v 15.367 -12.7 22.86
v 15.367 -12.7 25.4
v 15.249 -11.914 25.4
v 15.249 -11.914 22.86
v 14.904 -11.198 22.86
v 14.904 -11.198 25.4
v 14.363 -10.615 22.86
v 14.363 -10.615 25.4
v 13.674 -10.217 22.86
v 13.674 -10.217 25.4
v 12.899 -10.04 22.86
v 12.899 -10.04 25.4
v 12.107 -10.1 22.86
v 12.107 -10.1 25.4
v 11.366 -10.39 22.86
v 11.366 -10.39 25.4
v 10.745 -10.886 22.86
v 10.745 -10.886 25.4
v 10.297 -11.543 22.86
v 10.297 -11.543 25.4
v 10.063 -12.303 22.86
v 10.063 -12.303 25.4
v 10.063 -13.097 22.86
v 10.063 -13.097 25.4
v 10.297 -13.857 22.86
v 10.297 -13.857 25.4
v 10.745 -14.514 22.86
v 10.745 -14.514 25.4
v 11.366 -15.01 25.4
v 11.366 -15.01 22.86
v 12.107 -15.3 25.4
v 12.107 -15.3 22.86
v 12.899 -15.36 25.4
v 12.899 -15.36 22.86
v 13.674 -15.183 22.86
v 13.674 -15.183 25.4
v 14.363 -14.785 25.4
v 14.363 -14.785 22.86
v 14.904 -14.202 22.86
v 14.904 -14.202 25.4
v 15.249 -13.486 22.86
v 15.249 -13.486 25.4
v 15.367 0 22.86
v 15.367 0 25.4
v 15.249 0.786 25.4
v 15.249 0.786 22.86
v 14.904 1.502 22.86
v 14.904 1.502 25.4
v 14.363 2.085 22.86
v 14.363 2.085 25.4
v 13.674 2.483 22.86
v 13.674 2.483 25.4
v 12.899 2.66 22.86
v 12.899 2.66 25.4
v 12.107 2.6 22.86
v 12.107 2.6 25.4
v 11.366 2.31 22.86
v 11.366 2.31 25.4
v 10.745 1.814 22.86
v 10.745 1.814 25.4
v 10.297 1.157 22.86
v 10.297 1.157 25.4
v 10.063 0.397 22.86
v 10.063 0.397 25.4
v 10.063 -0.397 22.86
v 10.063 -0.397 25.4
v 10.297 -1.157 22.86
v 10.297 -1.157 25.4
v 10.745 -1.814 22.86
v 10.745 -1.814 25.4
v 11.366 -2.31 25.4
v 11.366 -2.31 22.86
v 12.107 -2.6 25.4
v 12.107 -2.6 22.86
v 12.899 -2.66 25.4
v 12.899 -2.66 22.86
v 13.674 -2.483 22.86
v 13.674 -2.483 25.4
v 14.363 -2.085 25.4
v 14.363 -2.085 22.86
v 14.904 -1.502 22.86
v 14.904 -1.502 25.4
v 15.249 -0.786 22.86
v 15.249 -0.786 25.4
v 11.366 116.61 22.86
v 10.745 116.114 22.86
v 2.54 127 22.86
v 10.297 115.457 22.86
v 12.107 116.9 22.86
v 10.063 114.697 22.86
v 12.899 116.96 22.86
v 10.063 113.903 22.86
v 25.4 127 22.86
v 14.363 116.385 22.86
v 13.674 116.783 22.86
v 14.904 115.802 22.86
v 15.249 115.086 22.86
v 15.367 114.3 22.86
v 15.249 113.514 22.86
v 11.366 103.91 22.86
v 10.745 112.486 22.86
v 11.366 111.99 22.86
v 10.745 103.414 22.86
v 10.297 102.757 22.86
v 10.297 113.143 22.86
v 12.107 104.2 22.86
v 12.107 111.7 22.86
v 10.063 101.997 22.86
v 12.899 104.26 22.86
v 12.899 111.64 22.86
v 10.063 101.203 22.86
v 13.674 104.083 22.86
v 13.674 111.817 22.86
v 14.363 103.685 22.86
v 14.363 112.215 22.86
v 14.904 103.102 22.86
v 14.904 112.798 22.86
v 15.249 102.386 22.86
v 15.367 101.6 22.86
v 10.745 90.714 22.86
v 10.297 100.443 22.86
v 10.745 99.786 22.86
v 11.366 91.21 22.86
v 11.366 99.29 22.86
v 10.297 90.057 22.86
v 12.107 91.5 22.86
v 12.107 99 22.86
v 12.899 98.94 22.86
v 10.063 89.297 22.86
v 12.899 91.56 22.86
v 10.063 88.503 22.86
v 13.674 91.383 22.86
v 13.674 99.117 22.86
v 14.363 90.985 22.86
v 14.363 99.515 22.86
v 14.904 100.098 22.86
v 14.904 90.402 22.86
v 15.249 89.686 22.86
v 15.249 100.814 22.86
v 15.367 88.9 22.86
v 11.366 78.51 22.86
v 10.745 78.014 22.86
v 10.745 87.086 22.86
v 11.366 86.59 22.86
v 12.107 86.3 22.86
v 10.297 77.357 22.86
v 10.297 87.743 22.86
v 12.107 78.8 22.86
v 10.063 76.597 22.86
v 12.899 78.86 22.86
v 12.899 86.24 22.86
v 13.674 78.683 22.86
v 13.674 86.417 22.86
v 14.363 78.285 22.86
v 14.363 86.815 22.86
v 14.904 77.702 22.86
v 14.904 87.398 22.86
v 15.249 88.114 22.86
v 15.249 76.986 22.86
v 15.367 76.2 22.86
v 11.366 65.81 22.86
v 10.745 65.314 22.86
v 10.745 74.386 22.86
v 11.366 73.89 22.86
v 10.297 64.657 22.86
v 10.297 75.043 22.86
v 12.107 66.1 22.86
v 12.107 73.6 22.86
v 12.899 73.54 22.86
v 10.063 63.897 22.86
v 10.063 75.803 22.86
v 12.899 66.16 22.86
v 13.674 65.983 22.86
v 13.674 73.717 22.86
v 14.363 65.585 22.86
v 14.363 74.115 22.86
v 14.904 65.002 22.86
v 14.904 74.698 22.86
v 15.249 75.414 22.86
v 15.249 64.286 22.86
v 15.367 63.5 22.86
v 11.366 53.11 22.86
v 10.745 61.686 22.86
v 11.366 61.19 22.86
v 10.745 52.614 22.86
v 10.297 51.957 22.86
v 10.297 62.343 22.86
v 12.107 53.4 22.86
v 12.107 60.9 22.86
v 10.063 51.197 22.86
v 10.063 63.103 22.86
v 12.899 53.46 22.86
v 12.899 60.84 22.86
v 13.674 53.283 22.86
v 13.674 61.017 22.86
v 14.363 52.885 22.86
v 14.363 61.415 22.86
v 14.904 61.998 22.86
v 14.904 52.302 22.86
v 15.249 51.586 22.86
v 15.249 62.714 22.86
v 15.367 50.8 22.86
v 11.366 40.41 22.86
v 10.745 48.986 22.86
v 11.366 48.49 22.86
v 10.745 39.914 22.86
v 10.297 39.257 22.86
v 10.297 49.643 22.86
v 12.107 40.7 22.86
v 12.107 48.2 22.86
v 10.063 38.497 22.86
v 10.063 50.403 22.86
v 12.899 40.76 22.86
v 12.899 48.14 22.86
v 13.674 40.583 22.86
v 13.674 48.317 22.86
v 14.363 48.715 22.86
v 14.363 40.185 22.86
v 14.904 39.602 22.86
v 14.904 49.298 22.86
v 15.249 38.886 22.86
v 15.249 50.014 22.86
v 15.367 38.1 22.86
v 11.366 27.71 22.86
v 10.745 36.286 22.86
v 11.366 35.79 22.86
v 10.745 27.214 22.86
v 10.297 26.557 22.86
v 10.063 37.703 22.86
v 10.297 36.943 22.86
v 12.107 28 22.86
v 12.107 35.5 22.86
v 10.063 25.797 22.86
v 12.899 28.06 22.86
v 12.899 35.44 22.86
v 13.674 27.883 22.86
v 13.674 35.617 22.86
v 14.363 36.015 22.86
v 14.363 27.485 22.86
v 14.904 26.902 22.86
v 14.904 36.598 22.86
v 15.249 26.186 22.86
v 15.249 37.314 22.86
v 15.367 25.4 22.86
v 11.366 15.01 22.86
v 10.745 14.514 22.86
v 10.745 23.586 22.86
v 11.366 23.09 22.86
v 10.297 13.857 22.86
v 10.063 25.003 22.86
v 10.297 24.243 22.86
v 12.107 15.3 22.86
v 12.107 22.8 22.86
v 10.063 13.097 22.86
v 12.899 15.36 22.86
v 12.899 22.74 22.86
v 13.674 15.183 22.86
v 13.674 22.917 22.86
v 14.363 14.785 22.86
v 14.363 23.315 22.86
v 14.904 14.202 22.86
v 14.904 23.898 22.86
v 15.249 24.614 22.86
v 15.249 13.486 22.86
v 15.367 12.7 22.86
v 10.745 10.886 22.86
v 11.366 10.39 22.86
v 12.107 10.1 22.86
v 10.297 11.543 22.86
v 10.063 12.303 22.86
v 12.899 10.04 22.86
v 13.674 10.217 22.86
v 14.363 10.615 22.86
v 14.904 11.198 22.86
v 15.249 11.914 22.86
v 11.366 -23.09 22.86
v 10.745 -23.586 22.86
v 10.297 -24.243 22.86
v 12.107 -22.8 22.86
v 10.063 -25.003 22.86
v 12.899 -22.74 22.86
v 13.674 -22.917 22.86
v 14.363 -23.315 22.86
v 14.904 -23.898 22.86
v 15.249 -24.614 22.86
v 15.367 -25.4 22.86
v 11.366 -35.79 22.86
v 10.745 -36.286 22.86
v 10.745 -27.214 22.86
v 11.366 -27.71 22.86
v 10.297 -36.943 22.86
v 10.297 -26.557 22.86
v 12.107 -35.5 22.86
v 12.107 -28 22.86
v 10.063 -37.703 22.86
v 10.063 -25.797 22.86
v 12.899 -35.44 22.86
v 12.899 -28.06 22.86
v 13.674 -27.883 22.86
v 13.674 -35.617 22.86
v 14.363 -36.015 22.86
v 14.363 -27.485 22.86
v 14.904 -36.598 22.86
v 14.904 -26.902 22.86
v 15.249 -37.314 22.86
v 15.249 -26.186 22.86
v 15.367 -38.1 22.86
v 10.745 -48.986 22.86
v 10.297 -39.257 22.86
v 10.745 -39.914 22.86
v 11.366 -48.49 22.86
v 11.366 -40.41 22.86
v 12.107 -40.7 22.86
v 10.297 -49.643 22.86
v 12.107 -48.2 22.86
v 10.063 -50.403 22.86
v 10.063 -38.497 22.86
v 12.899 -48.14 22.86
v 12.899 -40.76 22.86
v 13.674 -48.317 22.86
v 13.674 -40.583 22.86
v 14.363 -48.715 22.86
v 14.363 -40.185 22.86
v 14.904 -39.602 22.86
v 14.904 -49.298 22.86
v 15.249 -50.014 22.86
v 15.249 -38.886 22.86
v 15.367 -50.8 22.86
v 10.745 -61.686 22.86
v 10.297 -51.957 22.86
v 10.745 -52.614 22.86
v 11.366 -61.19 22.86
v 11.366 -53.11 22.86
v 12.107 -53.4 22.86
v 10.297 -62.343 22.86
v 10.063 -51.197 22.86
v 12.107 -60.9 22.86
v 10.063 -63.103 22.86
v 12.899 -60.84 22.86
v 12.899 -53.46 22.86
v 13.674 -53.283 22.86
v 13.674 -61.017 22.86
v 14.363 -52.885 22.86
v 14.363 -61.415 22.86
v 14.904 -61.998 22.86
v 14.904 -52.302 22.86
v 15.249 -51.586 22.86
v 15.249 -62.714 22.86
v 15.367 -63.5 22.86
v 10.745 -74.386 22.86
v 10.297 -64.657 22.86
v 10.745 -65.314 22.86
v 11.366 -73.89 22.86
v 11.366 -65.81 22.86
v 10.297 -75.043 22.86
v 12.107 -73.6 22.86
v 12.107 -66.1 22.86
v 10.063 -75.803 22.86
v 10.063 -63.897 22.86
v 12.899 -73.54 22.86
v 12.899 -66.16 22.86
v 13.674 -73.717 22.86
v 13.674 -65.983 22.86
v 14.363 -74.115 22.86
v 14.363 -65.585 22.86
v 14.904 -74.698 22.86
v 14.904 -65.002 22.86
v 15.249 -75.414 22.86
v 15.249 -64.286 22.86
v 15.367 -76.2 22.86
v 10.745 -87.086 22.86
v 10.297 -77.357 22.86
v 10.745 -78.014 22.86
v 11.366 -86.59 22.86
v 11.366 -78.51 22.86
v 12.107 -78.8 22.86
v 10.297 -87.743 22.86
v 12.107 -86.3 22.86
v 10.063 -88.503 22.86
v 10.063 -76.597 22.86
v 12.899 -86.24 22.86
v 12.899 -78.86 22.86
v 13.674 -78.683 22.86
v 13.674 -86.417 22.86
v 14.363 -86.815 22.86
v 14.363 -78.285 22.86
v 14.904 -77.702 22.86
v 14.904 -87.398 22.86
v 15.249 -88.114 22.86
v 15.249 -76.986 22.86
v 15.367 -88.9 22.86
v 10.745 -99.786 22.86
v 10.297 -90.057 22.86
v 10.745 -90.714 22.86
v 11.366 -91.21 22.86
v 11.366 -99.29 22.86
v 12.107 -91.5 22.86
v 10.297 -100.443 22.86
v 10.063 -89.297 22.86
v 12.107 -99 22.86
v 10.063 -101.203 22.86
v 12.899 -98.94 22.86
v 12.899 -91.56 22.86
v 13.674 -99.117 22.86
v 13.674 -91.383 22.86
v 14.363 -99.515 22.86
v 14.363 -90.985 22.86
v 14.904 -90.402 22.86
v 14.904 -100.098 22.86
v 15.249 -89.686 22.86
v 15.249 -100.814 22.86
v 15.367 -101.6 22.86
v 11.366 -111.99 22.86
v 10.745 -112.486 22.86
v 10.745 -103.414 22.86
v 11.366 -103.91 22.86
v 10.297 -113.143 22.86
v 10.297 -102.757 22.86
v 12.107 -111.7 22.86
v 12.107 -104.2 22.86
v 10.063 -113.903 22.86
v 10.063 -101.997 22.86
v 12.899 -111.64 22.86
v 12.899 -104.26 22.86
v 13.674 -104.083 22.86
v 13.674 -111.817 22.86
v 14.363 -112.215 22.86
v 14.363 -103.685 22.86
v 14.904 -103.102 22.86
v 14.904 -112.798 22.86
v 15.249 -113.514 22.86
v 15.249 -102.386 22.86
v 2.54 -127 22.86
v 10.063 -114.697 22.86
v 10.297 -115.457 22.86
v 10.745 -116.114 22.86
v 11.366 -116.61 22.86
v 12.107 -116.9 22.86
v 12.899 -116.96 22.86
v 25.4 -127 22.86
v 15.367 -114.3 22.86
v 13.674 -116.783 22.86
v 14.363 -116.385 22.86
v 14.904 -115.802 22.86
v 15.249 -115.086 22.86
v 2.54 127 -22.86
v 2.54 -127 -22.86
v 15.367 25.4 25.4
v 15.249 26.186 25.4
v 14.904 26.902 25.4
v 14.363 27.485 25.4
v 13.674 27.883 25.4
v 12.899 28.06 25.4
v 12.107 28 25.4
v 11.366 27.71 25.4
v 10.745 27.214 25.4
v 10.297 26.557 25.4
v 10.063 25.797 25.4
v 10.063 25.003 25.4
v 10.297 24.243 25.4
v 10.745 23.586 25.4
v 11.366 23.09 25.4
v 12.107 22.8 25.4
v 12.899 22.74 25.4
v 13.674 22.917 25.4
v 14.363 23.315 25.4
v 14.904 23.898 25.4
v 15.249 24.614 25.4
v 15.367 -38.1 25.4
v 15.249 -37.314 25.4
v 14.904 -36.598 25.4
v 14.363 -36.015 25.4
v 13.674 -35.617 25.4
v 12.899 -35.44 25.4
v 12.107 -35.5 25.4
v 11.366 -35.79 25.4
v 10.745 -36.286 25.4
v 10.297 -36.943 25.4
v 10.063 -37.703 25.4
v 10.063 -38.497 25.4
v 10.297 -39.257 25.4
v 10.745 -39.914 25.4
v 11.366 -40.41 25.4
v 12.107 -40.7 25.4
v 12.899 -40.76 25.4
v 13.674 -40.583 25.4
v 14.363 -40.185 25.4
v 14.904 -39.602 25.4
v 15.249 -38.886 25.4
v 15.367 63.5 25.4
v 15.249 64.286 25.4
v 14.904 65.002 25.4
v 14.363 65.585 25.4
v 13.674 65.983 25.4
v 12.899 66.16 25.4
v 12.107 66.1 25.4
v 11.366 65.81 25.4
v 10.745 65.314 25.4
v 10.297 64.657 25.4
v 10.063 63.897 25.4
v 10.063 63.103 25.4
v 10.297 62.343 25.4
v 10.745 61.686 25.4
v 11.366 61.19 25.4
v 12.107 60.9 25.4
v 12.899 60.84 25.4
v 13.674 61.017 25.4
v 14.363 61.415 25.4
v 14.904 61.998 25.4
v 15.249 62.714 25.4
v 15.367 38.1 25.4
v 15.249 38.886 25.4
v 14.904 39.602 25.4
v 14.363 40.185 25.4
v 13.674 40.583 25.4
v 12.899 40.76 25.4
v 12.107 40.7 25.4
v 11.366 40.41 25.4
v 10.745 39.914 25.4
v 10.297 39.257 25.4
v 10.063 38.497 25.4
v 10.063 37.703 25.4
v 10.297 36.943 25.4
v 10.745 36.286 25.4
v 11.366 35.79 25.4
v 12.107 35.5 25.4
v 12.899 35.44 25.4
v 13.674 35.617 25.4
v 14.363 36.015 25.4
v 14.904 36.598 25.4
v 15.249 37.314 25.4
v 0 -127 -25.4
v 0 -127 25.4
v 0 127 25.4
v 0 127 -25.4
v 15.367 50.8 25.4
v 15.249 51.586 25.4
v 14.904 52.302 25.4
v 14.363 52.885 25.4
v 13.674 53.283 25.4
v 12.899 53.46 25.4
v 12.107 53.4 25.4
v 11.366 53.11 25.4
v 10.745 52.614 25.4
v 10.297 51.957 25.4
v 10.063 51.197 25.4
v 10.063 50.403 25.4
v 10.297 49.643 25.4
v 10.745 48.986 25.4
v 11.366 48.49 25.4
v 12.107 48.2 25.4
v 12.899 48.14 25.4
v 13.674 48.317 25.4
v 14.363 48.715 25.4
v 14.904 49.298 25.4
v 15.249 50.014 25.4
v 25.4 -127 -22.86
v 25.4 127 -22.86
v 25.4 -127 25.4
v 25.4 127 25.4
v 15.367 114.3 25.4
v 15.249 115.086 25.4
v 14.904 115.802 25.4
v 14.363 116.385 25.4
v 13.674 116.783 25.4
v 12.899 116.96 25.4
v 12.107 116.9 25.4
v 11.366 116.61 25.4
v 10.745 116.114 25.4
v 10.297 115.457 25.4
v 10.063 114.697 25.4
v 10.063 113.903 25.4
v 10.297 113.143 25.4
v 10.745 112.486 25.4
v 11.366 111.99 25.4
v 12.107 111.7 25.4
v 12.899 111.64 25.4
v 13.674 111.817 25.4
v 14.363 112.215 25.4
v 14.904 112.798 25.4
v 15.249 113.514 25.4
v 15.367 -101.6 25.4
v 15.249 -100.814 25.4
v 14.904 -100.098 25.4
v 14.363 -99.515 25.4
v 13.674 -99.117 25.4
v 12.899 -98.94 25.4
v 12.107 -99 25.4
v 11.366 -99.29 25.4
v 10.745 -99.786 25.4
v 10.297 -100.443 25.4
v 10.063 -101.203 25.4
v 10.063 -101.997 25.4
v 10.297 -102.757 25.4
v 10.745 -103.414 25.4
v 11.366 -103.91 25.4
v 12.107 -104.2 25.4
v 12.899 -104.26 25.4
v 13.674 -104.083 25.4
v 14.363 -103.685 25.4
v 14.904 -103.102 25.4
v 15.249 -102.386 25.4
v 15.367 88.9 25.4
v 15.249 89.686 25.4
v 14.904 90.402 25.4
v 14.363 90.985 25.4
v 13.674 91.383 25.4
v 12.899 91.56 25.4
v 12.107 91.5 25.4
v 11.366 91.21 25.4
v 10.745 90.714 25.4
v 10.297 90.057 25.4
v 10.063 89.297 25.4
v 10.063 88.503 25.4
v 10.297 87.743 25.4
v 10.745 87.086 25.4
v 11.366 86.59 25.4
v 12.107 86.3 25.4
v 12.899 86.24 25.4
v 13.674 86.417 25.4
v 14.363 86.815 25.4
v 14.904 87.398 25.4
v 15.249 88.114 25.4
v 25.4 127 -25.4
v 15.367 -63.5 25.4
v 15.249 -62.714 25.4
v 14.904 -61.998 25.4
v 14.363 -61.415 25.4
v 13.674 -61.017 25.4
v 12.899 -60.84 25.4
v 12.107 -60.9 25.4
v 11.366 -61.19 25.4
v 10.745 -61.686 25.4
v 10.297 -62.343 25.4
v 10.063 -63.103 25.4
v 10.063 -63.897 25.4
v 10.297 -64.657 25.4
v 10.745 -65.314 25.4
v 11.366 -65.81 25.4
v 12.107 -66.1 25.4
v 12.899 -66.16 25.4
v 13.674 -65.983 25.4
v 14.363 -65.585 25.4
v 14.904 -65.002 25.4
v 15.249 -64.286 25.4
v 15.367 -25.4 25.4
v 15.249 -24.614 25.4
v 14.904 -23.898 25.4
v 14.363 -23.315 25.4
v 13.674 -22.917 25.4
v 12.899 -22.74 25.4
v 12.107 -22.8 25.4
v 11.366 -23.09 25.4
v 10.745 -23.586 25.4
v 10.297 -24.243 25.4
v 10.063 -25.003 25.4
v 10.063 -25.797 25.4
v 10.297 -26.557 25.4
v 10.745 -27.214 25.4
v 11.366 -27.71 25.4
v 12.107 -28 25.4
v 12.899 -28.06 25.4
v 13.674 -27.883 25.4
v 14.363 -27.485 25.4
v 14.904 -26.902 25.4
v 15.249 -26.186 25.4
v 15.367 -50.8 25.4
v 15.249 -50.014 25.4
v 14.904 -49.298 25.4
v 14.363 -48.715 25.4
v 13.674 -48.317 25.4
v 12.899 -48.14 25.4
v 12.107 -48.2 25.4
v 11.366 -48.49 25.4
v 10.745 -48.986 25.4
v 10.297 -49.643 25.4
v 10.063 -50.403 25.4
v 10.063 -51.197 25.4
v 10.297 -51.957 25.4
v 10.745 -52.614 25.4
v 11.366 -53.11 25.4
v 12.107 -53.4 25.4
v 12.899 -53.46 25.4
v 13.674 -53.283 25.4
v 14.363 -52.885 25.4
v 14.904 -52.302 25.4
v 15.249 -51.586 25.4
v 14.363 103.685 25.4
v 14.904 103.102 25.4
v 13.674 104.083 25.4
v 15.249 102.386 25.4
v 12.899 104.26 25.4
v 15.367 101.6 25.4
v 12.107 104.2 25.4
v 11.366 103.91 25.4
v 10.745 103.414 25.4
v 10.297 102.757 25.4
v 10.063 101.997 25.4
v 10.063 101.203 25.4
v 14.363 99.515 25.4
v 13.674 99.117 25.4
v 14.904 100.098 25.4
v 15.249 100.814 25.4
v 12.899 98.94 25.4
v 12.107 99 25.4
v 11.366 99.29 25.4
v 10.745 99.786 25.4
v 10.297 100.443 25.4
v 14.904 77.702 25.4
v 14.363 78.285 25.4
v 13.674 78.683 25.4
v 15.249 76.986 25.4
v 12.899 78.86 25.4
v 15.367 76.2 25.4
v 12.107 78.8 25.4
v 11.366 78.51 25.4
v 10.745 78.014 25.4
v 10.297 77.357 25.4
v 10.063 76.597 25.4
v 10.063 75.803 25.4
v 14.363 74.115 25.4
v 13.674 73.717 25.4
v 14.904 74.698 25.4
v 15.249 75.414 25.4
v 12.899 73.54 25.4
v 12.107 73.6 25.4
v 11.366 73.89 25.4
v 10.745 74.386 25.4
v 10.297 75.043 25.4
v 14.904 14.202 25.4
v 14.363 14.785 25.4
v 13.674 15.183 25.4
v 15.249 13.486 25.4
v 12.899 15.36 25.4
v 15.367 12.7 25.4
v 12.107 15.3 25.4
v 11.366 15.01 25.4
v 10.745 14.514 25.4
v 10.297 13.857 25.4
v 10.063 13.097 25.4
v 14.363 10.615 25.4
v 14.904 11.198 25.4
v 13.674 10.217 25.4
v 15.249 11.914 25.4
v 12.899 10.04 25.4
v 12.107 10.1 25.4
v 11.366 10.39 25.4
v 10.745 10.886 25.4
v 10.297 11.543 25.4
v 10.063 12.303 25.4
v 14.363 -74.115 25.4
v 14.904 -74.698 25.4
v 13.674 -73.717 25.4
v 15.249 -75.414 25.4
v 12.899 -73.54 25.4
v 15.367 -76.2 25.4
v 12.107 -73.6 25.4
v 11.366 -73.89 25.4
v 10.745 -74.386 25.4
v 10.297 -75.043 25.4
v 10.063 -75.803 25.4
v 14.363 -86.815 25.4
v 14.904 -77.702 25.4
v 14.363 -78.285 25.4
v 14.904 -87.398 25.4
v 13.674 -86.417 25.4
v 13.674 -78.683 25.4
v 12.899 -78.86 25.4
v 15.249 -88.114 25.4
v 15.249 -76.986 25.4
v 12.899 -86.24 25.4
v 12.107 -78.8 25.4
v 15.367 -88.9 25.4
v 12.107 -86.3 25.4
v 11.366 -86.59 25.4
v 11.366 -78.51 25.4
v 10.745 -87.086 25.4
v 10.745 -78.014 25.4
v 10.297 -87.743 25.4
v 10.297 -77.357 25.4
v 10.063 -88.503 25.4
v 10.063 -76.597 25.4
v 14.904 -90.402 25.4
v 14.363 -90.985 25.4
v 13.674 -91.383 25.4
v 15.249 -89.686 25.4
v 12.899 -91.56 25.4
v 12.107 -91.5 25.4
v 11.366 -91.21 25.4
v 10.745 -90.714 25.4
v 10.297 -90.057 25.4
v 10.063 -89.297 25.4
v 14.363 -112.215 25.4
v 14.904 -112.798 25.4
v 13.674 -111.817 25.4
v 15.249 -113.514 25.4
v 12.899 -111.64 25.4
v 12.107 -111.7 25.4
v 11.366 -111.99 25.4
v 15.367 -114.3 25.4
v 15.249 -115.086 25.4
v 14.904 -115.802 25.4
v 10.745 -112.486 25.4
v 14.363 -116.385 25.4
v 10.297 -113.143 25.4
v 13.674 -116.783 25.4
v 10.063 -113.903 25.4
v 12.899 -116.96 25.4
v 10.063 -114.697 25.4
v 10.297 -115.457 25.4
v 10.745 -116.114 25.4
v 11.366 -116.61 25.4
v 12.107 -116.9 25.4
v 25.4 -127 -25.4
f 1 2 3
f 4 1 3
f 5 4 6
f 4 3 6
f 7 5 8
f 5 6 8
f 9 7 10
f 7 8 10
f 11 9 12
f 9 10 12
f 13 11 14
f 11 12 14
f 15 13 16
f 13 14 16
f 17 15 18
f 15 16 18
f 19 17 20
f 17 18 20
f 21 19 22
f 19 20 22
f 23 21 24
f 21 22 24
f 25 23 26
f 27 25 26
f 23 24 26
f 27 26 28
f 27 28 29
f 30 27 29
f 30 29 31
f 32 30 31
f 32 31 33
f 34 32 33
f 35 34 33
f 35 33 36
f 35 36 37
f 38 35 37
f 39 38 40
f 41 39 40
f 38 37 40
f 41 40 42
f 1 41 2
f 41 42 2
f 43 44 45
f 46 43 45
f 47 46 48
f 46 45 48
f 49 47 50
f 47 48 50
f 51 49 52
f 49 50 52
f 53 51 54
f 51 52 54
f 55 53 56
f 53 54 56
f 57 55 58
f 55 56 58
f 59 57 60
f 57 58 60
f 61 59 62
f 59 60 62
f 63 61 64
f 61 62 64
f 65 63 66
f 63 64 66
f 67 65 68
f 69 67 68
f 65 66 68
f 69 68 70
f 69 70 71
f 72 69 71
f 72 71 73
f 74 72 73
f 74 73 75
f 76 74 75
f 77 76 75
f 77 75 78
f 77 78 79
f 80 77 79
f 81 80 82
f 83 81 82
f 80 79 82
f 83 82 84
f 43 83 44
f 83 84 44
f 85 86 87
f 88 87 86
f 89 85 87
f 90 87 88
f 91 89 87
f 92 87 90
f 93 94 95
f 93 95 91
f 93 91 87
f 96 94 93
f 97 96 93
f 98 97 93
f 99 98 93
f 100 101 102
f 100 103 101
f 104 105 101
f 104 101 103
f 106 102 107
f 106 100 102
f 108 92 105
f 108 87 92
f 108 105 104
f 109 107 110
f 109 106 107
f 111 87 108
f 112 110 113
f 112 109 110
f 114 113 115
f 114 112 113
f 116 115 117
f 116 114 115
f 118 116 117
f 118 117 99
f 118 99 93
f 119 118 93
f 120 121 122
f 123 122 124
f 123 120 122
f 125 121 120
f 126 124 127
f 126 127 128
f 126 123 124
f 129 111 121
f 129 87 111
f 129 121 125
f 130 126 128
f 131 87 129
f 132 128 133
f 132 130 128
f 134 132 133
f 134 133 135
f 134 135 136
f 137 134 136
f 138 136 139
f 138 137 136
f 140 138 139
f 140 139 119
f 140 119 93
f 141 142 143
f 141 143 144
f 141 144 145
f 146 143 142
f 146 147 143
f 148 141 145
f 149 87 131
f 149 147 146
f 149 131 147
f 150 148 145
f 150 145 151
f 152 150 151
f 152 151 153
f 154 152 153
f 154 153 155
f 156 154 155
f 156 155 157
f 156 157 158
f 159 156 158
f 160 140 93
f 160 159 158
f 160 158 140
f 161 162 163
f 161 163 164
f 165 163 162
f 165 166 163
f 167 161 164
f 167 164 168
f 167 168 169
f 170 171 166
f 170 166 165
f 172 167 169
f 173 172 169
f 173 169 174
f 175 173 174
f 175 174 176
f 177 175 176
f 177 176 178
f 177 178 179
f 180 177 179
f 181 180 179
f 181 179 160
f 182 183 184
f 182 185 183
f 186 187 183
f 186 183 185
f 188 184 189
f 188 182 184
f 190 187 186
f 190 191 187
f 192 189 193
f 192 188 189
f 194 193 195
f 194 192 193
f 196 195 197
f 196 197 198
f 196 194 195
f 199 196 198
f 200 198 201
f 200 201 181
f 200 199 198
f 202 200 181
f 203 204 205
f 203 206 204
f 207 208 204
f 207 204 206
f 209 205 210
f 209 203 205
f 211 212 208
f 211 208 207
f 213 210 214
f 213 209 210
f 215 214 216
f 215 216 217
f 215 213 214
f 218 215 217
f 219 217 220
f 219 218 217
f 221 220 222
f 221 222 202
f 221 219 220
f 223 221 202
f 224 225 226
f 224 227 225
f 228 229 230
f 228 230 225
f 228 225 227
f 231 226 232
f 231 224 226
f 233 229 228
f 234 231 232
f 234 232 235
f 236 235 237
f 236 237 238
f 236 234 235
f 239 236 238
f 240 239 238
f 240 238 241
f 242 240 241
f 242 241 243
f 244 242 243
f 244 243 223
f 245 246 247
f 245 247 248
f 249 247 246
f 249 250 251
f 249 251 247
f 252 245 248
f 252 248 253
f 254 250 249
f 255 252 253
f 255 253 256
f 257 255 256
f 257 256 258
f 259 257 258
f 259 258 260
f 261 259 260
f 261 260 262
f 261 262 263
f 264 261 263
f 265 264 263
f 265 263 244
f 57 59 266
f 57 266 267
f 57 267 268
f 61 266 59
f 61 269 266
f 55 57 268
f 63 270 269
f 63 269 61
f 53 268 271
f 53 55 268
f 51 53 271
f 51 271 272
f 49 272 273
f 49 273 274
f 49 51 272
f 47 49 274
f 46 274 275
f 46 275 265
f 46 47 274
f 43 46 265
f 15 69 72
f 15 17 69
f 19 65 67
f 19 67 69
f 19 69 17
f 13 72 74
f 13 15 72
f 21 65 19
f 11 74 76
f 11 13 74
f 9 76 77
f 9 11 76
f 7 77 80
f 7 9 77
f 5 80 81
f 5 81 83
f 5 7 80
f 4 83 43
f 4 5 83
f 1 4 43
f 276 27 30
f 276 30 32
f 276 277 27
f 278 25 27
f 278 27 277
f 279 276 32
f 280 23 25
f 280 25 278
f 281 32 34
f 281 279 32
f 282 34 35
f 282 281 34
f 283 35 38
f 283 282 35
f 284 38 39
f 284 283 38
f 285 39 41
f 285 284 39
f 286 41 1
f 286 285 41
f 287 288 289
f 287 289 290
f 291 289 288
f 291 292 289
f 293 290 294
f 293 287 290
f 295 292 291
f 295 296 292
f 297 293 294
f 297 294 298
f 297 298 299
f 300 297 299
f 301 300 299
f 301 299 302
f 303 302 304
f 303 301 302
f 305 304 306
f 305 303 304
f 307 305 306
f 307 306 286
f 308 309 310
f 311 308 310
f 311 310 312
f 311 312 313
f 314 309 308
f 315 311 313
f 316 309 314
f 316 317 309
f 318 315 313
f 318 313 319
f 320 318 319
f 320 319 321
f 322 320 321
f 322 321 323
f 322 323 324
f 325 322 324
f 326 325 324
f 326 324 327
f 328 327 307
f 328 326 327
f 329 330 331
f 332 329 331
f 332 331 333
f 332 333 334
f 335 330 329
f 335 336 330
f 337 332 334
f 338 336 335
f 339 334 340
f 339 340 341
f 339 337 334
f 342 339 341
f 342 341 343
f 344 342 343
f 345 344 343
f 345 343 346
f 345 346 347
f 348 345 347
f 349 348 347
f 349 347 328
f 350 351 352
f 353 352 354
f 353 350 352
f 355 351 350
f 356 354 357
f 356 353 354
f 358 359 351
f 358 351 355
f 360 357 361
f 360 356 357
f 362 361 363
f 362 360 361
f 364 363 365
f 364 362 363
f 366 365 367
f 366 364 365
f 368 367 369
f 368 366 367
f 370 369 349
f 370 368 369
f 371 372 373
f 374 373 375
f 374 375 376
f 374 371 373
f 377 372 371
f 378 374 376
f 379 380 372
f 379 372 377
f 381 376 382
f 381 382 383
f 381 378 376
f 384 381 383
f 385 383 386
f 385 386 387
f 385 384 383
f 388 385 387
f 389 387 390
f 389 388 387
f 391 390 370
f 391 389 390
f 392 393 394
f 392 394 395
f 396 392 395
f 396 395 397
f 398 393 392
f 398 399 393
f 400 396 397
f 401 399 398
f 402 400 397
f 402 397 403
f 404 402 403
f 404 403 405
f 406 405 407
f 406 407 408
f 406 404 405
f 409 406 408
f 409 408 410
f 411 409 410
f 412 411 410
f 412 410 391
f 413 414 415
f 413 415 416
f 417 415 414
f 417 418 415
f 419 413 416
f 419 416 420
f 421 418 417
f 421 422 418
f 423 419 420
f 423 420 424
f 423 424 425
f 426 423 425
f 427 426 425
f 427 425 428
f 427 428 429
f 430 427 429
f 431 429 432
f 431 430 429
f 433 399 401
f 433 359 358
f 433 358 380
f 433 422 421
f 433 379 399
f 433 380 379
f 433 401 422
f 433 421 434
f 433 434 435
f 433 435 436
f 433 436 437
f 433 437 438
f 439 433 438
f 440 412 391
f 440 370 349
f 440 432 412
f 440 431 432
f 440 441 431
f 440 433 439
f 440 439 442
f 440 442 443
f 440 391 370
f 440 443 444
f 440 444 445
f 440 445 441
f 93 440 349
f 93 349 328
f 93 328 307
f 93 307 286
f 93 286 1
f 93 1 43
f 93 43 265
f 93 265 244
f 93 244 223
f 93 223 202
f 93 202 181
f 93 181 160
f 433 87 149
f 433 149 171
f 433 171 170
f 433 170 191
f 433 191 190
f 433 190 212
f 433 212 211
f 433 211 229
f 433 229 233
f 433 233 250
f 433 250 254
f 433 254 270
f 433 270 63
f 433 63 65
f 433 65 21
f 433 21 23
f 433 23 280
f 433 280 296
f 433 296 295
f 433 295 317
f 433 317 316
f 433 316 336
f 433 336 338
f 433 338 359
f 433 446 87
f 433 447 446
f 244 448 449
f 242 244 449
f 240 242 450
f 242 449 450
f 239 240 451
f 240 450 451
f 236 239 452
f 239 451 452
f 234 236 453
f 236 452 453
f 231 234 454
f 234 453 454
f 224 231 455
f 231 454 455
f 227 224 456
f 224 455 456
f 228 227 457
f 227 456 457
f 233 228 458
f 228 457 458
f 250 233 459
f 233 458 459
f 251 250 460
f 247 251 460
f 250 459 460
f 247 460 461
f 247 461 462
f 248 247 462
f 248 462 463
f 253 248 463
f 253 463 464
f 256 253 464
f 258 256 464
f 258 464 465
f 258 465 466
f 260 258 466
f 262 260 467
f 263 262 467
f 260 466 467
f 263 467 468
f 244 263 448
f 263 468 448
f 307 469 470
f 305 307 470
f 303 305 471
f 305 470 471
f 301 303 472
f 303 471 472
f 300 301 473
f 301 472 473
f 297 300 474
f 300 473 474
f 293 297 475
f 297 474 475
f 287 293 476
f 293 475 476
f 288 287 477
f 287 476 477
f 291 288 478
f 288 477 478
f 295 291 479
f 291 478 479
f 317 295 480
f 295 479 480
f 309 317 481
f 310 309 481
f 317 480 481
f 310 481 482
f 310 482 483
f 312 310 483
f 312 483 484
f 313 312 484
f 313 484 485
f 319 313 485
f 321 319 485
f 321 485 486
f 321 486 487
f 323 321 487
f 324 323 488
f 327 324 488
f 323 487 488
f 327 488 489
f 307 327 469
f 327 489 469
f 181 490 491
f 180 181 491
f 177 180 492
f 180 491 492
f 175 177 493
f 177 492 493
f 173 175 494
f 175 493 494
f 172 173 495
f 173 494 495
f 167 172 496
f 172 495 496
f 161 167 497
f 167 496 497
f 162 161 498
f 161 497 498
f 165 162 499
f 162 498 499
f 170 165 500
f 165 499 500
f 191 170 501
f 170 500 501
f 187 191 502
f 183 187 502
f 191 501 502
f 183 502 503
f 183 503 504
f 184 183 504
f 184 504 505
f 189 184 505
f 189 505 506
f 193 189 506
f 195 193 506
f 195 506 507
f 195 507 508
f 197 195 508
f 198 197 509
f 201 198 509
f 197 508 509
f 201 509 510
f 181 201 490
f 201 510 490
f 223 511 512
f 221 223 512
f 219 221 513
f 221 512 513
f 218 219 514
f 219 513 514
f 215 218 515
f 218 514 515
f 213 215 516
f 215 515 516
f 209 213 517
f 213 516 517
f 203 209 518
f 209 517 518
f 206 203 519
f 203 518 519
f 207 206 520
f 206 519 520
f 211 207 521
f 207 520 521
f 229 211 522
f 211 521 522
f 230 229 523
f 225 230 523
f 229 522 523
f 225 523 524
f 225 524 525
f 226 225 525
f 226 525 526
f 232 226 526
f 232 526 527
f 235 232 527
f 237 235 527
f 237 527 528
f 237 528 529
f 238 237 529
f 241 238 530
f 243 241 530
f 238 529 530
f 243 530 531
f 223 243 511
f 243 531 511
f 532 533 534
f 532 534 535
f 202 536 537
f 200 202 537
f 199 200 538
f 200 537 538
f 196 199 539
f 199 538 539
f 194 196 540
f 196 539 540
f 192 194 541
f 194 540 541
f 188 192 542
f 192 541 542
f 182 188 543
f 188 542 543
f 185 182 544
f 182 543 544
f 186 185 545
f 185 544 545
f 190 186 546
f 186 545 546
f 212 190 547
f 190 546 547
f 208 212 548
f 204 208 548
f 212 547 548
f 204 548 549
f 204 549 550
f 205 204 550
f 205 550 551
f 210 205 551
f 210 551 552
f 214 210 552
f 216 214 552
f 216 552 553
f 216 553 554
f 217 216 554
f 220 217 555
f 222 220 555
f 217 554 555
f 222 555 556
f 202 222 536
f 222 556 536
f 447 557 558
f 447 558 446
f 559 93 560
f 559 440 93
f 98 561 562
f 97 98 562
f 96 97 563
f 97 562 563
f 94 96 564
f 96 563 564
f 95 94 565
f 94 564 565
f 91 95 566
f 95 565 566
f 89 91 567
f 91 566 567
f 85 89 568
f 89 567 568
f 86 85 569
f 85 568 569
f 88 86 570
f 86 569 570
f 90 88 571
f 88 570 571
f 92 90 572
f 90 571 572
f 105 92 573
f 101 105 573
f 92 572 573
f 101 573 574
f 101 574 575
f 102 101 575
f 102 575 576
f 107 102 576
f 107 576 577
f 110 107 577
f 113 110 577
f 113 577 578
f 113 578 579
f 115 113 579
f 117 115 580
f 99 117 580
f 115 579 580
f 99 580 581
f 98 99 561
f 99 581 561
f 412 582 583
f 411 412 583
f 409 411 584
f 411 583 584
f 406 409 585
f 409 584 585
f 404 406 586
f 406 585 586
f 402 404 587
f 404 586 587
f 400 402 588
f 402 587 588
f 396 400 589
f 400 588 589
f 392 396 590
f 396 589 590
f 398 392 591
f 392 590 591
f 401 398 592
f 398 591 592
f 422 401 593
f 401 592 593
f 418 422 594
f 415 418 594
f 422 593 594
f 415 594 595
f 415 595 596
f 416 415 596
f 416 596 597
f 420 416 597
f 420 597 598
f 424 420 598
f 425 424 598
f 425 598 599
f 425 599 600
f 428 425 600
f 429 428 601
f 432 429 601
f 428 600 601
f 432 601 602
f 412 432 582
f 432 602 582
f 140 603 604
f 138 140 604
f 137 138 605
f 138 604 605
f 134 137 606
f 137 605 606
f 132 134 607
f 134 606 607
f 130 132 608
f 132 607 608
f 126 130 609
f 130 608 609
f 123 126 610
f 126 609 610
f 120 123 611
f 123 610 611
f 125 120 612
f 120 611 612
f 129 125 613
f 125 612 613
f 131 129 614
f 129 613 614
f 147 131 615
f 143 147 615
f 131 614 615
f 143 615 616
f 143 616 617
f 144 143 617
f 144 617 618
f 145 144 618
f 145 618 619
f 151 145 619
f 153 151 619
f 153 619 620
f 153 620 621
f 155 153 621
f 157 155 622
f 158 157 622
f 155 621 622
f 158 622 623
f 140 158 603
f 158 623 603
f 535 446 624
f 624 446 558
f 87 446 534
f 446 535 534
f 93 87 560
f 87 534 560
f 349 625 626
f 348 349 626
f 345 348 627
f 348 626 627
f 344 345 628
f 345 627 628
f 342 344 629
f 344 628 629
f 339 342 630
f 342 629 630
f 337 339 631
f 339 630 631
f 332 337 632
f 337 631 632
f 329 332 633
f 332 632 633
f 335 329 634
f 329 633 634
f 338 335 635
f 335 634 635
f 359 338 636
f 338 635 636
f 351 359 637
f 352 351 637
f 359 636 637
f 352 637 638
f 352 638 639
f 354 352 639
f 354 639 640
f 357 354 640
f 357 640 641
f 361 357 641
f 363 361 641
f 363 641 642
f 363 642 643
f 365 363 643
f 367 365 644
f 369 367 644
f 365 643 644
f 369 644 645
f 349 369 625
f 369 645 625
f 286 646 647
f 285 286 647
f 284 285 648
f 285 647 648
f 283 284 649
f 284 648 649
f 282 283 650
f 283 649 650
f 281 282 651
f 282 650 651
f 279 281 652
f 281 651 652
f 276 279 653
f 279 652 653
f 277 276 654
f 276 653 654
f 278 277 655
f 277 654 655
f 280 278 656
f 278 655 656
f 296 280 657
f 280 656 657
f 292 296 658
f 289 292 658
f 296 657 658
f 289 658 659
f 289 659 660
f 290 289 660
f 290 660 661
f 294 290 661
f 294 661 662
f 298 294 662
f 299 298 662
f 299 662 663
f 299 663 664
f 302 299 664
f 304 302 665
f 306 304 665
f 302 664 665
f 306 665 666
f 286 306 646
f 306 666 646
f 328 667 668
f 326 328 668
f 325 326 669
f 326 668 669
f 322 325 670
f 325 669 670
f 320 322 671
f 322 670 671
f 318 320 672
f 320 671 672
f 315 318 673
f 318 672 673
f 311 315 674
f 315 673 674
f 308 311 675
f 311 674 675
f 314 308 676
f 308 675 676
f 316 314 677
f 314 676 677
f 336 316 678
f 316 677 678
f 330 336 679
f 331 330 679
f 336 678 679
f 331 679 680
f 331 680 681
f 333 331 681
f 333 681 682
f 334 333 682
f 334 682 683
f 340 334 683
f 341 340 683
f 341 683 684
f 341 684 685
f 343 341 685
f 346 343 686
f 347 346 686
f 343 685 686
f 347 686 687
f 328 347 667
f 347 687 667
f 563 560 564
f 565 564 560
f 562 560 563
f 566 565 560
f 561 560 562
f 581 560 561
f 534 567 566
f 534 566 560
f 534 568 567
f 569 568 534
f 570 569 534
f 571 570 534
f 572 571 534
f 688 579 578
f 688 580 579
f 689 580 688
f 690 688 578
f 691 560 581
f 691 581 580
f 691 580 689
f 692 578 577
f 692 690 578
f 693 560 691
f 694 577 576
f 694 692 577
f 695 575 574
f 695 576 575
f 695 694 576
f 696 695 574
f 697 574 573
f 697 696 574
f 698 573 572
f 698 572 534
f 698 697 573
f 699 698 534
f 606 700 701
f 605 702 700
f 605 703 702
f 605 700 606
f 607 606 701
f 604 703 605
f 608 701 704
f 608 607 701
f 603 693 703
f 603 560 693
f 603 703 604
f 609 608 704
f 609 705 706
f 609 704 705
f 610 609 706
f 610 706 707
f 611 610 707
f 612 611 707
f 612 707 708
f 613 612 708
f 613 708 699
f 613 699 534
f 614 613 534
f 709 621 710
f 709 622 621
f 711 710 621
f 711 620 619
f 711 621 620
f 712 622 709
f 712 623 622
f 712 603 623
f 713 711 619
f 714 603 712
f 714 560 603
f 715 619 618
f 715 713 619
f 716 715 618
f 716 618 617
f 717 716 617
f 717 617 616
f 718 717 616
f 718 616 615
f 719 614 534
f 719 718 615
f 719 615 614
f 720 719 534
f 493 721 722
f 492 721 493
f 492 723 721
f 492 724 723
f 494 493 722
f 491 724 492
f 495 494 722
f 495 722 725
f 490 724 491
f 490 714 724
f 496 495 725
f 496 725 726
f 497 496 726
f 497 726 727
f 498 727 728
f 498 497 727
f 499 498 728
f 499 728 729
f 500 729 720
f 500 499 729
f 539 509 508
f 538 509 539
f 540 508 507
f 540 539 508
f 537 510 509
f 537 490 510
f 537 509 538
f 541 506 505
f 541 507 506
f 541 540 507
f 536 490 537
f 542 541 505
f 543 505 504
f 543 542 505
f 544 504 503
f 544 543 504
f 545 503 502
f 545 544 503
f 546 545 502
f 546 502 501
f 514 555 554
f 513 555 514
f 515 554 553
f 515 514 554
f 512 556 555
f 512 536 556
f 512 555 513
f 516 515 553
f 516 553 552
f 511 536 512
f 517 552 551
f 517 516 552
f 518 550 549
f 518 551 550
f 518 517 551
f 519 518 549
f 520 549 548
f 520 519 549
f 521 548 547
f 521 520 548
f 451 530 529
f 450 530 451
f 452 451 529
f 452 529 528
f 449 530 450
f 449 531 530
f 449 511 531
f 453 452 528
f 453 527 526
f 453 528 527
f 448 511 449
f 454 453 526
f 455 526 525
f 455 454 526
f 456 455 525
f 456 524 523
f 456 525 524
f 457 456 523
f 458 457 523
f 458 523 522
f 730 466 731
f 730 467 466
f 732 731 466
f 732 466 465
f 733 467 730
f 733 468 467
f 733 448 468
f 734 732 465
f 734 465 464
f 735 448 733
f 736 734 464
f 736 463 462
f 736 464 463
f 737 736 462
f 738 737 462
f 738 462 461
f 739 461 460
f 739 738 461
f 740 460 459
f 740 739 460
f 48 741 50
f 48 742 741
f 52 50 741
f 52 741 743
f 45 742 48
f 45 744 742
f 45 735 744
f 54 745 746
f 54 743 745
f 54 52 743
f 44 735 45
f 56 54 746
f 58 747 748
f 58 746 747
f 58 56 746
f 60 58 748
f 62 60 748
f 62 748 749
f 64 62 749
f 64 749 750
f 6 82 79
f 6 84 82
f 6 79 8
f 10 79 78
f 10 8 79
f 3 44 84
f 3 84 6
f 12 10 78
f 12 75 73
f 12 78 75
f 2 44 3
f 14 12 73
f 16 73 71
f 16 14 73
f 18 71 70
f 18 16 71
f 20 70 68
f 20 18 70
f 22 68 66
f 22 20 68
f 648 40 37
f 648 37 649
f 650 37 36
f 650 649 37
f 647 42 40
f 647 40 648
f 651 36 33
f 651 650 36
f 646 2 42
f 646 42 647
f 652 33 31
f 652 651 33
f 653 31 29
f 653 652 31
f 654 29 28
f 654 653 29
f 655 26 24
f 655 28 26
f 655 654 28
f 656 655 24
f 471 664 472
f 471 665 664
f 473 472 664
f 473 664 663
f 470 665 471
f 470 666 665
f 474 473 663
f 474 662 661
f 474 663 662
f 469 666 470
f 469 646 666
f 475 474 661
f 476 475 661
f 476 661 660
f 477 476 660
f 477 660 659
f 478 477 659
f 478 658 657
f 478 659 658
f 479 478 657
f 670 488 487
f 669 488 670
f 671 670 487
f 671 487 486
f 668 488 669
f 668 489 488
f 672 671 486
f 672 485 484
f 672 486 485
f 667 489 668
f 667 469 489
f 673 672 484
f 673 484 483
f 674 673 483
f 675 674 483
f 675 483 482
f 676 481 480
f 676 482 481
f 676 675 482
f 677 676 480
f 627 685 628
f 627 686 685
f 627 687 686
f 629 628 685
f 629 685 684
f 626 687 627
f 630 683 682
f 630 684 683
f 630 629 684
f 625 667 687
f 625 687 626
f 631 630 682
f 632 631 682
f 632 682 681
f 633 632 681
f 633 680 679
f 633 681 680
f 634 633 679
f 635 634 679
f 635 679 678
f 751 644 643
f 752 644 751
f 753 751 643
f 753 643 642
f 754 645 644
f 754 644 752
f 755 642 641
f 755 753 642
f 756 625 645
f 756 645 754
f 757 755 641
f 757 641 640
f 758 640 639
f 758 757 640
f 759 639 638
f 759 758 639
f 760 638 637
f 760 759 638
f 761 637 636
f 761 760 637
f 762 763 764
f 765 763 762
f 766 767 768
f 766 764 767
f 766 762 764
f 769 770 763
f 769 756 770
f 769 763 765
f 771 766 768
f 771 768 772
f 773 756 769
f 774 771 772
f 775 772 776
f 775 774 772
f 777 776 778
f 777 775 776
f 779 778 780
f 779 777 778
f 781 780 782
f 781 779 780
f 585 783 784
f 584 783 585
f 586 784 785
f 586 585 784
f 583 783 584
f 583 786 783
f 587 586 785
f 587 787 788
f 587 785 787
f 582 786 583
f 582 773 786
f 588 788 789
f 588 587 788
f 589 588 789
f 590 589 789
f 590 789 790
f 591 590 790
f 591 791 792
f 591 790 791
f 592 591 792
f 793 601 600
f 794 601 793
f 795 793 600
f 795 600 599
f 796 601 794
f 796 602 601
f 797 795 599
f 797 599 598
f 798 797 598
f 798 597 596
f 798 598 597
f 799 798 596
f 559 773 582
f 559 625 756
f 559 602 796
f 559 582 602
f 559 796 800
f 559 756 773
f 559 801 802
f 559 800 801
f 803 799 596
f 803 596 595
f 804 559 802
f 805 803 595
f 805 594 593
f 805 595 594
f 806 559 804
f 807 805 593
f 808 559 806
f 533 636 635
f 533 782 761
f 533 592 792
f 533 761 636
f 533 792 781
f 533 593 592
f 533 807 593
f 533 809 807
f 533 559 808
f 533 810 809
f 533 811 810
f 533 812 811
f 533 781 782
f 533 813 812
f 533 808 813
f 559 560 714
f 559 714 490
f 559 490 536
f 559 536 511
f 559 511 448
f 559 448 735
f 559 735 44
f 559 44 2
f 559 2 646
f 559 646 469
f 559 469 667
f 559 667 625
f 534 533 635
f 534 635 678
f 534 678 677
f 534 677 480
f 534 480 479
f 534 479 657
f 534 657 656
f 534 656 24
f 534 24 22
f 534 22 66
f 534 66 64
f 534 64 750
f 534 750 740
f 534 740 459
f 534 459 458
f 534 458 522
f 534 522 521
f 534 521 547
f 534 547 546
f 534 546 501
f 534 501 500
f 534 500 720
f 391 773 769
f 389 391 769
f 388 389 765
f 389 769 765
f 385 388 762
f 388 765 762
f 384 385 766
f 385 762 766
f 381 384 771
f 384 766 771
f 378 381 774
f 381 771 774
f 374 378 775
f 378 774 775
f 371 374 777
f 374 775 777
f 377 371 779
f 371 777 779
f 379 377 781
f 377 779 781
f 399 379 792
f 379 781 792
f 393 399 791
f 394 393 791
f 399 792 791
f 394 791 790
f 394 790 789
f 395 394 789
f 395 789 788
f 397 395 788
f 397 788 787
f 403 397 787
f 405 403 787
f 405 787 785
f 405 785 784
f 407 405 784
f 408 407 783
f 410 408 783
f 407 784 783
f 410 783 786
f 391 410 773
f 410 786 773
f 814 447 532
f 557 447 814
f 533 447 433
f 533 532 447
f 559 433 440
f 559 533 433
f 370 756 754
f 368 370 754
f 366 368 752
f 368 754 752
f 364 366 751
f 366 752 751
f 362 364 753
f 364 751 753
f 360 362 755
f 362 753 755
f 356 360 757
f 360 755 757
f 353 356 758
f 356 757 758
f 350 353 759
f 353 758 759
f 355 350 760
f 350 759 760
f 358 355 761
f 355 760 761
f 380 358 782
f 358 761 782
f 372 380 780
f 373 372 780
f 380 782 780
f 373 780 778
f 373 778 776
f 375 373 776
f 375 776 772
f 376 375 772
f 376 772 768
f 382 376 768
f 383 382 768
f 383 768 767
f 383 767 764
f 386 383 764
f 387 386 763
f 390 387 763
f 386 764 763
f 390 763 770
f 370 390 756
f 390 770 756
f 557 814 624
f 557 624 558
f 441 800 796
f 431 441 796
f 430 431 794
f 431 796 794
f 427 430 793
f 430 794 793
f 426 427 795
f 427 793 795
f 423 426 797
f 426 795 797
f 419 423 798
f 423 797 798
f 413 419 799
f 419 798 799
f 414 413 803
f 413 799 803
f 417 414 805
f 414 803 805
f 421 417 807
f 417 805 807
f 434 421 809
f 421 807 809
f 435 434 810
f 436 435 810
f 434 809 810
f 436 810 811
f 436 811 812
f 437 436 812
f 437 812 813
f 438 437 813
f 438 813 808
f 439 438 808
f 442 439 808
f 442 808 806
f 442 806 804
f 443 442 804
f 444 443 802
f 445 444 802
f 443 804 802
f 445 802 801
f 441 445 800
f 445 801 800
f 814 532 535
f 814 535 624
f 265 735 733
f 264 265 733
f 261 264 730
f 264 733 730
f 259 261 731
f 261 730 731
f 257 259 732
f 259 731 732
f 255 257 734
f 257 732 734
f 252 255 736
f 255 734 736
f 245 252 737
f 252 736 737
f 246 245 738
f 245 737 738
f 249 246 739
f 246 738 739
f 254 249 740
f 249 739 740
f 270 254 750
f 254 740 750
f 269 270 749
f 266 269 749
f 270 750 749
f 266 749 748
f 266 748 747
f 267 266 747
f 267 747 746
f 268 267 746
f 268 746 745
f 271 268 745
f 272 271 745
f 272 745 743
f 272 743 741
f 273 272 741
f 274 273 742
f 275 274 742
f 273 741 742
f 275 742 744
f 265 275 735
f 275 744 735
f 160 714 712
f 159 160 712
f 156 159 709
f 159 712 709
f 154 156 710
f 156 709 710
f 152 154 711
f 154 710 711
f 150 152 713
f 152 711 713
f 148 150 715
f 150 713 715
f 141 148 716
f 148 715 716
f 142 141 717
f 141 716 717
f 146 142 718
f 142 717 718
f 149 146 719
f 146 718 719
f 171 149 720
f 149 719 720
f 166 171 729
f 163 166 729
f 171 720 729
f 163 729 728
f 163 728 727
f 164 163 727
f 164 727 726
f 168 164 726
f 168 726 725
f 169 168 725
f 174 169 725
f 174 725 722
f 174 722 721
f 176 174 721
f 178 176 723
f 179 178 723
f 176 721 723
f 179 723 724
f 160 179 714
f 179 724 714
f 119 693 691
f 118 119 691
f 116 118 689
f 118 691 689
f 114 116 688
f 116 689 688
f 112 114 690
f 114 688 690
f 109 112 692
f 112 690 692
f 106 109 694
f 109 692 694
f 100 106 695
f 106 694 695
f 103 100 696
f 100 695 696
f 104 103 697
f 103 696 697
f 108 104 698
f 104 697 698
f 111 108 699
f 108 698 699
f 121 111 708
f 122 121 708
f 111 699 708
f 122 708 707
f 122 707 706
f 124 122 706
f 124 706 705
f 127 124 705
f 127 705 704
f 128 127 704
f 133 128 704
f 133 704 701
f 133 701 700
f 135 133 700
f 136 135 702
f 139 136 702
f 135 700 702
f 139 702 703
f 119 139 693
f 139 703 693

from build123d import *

# Parameters (mm, degrees)
F1_DEPTH = 127
F2_R     = 2.667
F3_DEPTH = 2.54


with BuildPart() as f1:
    # F0 (on Front) → F1 (new body, symmetric)
    with BuildSketch(Plane.XZ):
        Polygon((25.4, 22.86), (25.4, 25.4), (0, 25.4), (0, -25.4), (25.4, -25.4), (25.4, -22.86), (2.54, -22.86), (2.54, 22.86), align=None)
    extrude(amount=F1_DEPTH, both=True)

    # F2 (on face) → F3 (cut)
    with BuildSketch(Plane.XY.offset(25.4)):
        with Locations((12.7, -50.8)):
            Circle(F2_R)
        with Locations((12.7, -63.5)):
            Circle(F2_R)
        with Locations((12.7, -114.3)):
            Circle(F2_R)
        with Locations((12.7, 101.6)):
            Circle(F2_R)
        with Locations((12.7, -76.2)):
            Circle(F2_R)
        with Locations((12.7, 76.2)):
            Circle(F2_R)
        with Locations((12.7, 88.9)):
            Circle(F2_R)
        with Locations((12.7, 50.8)):
            Circle(F2_R)
        with Locations((12.7, -101.6)):
            Circle(F2_R)
        with Locations((12.7, -25.4)):
            Circle(F2_R)
        with Locations((12.7, -38.1)):
            Circle(F2_R)
        with Locations((12.7, 12.7)):
            Circle(F2_R)
        with Locations((12.7, -88.9)):
            Circle(F2_R)
        with Locations((12.7, -12.7)):
            Circle(F2_R)
        with Locations((12.7, 25.4)):
            Circle(F2_R)
        with Locations((12.7, 38.1)):
            Circle(F2_R)
        with Locations((12.7, 0)):
            Circle(F2_R)
        with Locations((12.7, 63.5)):
            Circle(F2_R)
        with Locations((12.7, 114.3)):
            Circle(F2_R)
    extrude(amount=-F3_DEPTH, mode=Mode.SUBTRACT)


solid = f1.part
